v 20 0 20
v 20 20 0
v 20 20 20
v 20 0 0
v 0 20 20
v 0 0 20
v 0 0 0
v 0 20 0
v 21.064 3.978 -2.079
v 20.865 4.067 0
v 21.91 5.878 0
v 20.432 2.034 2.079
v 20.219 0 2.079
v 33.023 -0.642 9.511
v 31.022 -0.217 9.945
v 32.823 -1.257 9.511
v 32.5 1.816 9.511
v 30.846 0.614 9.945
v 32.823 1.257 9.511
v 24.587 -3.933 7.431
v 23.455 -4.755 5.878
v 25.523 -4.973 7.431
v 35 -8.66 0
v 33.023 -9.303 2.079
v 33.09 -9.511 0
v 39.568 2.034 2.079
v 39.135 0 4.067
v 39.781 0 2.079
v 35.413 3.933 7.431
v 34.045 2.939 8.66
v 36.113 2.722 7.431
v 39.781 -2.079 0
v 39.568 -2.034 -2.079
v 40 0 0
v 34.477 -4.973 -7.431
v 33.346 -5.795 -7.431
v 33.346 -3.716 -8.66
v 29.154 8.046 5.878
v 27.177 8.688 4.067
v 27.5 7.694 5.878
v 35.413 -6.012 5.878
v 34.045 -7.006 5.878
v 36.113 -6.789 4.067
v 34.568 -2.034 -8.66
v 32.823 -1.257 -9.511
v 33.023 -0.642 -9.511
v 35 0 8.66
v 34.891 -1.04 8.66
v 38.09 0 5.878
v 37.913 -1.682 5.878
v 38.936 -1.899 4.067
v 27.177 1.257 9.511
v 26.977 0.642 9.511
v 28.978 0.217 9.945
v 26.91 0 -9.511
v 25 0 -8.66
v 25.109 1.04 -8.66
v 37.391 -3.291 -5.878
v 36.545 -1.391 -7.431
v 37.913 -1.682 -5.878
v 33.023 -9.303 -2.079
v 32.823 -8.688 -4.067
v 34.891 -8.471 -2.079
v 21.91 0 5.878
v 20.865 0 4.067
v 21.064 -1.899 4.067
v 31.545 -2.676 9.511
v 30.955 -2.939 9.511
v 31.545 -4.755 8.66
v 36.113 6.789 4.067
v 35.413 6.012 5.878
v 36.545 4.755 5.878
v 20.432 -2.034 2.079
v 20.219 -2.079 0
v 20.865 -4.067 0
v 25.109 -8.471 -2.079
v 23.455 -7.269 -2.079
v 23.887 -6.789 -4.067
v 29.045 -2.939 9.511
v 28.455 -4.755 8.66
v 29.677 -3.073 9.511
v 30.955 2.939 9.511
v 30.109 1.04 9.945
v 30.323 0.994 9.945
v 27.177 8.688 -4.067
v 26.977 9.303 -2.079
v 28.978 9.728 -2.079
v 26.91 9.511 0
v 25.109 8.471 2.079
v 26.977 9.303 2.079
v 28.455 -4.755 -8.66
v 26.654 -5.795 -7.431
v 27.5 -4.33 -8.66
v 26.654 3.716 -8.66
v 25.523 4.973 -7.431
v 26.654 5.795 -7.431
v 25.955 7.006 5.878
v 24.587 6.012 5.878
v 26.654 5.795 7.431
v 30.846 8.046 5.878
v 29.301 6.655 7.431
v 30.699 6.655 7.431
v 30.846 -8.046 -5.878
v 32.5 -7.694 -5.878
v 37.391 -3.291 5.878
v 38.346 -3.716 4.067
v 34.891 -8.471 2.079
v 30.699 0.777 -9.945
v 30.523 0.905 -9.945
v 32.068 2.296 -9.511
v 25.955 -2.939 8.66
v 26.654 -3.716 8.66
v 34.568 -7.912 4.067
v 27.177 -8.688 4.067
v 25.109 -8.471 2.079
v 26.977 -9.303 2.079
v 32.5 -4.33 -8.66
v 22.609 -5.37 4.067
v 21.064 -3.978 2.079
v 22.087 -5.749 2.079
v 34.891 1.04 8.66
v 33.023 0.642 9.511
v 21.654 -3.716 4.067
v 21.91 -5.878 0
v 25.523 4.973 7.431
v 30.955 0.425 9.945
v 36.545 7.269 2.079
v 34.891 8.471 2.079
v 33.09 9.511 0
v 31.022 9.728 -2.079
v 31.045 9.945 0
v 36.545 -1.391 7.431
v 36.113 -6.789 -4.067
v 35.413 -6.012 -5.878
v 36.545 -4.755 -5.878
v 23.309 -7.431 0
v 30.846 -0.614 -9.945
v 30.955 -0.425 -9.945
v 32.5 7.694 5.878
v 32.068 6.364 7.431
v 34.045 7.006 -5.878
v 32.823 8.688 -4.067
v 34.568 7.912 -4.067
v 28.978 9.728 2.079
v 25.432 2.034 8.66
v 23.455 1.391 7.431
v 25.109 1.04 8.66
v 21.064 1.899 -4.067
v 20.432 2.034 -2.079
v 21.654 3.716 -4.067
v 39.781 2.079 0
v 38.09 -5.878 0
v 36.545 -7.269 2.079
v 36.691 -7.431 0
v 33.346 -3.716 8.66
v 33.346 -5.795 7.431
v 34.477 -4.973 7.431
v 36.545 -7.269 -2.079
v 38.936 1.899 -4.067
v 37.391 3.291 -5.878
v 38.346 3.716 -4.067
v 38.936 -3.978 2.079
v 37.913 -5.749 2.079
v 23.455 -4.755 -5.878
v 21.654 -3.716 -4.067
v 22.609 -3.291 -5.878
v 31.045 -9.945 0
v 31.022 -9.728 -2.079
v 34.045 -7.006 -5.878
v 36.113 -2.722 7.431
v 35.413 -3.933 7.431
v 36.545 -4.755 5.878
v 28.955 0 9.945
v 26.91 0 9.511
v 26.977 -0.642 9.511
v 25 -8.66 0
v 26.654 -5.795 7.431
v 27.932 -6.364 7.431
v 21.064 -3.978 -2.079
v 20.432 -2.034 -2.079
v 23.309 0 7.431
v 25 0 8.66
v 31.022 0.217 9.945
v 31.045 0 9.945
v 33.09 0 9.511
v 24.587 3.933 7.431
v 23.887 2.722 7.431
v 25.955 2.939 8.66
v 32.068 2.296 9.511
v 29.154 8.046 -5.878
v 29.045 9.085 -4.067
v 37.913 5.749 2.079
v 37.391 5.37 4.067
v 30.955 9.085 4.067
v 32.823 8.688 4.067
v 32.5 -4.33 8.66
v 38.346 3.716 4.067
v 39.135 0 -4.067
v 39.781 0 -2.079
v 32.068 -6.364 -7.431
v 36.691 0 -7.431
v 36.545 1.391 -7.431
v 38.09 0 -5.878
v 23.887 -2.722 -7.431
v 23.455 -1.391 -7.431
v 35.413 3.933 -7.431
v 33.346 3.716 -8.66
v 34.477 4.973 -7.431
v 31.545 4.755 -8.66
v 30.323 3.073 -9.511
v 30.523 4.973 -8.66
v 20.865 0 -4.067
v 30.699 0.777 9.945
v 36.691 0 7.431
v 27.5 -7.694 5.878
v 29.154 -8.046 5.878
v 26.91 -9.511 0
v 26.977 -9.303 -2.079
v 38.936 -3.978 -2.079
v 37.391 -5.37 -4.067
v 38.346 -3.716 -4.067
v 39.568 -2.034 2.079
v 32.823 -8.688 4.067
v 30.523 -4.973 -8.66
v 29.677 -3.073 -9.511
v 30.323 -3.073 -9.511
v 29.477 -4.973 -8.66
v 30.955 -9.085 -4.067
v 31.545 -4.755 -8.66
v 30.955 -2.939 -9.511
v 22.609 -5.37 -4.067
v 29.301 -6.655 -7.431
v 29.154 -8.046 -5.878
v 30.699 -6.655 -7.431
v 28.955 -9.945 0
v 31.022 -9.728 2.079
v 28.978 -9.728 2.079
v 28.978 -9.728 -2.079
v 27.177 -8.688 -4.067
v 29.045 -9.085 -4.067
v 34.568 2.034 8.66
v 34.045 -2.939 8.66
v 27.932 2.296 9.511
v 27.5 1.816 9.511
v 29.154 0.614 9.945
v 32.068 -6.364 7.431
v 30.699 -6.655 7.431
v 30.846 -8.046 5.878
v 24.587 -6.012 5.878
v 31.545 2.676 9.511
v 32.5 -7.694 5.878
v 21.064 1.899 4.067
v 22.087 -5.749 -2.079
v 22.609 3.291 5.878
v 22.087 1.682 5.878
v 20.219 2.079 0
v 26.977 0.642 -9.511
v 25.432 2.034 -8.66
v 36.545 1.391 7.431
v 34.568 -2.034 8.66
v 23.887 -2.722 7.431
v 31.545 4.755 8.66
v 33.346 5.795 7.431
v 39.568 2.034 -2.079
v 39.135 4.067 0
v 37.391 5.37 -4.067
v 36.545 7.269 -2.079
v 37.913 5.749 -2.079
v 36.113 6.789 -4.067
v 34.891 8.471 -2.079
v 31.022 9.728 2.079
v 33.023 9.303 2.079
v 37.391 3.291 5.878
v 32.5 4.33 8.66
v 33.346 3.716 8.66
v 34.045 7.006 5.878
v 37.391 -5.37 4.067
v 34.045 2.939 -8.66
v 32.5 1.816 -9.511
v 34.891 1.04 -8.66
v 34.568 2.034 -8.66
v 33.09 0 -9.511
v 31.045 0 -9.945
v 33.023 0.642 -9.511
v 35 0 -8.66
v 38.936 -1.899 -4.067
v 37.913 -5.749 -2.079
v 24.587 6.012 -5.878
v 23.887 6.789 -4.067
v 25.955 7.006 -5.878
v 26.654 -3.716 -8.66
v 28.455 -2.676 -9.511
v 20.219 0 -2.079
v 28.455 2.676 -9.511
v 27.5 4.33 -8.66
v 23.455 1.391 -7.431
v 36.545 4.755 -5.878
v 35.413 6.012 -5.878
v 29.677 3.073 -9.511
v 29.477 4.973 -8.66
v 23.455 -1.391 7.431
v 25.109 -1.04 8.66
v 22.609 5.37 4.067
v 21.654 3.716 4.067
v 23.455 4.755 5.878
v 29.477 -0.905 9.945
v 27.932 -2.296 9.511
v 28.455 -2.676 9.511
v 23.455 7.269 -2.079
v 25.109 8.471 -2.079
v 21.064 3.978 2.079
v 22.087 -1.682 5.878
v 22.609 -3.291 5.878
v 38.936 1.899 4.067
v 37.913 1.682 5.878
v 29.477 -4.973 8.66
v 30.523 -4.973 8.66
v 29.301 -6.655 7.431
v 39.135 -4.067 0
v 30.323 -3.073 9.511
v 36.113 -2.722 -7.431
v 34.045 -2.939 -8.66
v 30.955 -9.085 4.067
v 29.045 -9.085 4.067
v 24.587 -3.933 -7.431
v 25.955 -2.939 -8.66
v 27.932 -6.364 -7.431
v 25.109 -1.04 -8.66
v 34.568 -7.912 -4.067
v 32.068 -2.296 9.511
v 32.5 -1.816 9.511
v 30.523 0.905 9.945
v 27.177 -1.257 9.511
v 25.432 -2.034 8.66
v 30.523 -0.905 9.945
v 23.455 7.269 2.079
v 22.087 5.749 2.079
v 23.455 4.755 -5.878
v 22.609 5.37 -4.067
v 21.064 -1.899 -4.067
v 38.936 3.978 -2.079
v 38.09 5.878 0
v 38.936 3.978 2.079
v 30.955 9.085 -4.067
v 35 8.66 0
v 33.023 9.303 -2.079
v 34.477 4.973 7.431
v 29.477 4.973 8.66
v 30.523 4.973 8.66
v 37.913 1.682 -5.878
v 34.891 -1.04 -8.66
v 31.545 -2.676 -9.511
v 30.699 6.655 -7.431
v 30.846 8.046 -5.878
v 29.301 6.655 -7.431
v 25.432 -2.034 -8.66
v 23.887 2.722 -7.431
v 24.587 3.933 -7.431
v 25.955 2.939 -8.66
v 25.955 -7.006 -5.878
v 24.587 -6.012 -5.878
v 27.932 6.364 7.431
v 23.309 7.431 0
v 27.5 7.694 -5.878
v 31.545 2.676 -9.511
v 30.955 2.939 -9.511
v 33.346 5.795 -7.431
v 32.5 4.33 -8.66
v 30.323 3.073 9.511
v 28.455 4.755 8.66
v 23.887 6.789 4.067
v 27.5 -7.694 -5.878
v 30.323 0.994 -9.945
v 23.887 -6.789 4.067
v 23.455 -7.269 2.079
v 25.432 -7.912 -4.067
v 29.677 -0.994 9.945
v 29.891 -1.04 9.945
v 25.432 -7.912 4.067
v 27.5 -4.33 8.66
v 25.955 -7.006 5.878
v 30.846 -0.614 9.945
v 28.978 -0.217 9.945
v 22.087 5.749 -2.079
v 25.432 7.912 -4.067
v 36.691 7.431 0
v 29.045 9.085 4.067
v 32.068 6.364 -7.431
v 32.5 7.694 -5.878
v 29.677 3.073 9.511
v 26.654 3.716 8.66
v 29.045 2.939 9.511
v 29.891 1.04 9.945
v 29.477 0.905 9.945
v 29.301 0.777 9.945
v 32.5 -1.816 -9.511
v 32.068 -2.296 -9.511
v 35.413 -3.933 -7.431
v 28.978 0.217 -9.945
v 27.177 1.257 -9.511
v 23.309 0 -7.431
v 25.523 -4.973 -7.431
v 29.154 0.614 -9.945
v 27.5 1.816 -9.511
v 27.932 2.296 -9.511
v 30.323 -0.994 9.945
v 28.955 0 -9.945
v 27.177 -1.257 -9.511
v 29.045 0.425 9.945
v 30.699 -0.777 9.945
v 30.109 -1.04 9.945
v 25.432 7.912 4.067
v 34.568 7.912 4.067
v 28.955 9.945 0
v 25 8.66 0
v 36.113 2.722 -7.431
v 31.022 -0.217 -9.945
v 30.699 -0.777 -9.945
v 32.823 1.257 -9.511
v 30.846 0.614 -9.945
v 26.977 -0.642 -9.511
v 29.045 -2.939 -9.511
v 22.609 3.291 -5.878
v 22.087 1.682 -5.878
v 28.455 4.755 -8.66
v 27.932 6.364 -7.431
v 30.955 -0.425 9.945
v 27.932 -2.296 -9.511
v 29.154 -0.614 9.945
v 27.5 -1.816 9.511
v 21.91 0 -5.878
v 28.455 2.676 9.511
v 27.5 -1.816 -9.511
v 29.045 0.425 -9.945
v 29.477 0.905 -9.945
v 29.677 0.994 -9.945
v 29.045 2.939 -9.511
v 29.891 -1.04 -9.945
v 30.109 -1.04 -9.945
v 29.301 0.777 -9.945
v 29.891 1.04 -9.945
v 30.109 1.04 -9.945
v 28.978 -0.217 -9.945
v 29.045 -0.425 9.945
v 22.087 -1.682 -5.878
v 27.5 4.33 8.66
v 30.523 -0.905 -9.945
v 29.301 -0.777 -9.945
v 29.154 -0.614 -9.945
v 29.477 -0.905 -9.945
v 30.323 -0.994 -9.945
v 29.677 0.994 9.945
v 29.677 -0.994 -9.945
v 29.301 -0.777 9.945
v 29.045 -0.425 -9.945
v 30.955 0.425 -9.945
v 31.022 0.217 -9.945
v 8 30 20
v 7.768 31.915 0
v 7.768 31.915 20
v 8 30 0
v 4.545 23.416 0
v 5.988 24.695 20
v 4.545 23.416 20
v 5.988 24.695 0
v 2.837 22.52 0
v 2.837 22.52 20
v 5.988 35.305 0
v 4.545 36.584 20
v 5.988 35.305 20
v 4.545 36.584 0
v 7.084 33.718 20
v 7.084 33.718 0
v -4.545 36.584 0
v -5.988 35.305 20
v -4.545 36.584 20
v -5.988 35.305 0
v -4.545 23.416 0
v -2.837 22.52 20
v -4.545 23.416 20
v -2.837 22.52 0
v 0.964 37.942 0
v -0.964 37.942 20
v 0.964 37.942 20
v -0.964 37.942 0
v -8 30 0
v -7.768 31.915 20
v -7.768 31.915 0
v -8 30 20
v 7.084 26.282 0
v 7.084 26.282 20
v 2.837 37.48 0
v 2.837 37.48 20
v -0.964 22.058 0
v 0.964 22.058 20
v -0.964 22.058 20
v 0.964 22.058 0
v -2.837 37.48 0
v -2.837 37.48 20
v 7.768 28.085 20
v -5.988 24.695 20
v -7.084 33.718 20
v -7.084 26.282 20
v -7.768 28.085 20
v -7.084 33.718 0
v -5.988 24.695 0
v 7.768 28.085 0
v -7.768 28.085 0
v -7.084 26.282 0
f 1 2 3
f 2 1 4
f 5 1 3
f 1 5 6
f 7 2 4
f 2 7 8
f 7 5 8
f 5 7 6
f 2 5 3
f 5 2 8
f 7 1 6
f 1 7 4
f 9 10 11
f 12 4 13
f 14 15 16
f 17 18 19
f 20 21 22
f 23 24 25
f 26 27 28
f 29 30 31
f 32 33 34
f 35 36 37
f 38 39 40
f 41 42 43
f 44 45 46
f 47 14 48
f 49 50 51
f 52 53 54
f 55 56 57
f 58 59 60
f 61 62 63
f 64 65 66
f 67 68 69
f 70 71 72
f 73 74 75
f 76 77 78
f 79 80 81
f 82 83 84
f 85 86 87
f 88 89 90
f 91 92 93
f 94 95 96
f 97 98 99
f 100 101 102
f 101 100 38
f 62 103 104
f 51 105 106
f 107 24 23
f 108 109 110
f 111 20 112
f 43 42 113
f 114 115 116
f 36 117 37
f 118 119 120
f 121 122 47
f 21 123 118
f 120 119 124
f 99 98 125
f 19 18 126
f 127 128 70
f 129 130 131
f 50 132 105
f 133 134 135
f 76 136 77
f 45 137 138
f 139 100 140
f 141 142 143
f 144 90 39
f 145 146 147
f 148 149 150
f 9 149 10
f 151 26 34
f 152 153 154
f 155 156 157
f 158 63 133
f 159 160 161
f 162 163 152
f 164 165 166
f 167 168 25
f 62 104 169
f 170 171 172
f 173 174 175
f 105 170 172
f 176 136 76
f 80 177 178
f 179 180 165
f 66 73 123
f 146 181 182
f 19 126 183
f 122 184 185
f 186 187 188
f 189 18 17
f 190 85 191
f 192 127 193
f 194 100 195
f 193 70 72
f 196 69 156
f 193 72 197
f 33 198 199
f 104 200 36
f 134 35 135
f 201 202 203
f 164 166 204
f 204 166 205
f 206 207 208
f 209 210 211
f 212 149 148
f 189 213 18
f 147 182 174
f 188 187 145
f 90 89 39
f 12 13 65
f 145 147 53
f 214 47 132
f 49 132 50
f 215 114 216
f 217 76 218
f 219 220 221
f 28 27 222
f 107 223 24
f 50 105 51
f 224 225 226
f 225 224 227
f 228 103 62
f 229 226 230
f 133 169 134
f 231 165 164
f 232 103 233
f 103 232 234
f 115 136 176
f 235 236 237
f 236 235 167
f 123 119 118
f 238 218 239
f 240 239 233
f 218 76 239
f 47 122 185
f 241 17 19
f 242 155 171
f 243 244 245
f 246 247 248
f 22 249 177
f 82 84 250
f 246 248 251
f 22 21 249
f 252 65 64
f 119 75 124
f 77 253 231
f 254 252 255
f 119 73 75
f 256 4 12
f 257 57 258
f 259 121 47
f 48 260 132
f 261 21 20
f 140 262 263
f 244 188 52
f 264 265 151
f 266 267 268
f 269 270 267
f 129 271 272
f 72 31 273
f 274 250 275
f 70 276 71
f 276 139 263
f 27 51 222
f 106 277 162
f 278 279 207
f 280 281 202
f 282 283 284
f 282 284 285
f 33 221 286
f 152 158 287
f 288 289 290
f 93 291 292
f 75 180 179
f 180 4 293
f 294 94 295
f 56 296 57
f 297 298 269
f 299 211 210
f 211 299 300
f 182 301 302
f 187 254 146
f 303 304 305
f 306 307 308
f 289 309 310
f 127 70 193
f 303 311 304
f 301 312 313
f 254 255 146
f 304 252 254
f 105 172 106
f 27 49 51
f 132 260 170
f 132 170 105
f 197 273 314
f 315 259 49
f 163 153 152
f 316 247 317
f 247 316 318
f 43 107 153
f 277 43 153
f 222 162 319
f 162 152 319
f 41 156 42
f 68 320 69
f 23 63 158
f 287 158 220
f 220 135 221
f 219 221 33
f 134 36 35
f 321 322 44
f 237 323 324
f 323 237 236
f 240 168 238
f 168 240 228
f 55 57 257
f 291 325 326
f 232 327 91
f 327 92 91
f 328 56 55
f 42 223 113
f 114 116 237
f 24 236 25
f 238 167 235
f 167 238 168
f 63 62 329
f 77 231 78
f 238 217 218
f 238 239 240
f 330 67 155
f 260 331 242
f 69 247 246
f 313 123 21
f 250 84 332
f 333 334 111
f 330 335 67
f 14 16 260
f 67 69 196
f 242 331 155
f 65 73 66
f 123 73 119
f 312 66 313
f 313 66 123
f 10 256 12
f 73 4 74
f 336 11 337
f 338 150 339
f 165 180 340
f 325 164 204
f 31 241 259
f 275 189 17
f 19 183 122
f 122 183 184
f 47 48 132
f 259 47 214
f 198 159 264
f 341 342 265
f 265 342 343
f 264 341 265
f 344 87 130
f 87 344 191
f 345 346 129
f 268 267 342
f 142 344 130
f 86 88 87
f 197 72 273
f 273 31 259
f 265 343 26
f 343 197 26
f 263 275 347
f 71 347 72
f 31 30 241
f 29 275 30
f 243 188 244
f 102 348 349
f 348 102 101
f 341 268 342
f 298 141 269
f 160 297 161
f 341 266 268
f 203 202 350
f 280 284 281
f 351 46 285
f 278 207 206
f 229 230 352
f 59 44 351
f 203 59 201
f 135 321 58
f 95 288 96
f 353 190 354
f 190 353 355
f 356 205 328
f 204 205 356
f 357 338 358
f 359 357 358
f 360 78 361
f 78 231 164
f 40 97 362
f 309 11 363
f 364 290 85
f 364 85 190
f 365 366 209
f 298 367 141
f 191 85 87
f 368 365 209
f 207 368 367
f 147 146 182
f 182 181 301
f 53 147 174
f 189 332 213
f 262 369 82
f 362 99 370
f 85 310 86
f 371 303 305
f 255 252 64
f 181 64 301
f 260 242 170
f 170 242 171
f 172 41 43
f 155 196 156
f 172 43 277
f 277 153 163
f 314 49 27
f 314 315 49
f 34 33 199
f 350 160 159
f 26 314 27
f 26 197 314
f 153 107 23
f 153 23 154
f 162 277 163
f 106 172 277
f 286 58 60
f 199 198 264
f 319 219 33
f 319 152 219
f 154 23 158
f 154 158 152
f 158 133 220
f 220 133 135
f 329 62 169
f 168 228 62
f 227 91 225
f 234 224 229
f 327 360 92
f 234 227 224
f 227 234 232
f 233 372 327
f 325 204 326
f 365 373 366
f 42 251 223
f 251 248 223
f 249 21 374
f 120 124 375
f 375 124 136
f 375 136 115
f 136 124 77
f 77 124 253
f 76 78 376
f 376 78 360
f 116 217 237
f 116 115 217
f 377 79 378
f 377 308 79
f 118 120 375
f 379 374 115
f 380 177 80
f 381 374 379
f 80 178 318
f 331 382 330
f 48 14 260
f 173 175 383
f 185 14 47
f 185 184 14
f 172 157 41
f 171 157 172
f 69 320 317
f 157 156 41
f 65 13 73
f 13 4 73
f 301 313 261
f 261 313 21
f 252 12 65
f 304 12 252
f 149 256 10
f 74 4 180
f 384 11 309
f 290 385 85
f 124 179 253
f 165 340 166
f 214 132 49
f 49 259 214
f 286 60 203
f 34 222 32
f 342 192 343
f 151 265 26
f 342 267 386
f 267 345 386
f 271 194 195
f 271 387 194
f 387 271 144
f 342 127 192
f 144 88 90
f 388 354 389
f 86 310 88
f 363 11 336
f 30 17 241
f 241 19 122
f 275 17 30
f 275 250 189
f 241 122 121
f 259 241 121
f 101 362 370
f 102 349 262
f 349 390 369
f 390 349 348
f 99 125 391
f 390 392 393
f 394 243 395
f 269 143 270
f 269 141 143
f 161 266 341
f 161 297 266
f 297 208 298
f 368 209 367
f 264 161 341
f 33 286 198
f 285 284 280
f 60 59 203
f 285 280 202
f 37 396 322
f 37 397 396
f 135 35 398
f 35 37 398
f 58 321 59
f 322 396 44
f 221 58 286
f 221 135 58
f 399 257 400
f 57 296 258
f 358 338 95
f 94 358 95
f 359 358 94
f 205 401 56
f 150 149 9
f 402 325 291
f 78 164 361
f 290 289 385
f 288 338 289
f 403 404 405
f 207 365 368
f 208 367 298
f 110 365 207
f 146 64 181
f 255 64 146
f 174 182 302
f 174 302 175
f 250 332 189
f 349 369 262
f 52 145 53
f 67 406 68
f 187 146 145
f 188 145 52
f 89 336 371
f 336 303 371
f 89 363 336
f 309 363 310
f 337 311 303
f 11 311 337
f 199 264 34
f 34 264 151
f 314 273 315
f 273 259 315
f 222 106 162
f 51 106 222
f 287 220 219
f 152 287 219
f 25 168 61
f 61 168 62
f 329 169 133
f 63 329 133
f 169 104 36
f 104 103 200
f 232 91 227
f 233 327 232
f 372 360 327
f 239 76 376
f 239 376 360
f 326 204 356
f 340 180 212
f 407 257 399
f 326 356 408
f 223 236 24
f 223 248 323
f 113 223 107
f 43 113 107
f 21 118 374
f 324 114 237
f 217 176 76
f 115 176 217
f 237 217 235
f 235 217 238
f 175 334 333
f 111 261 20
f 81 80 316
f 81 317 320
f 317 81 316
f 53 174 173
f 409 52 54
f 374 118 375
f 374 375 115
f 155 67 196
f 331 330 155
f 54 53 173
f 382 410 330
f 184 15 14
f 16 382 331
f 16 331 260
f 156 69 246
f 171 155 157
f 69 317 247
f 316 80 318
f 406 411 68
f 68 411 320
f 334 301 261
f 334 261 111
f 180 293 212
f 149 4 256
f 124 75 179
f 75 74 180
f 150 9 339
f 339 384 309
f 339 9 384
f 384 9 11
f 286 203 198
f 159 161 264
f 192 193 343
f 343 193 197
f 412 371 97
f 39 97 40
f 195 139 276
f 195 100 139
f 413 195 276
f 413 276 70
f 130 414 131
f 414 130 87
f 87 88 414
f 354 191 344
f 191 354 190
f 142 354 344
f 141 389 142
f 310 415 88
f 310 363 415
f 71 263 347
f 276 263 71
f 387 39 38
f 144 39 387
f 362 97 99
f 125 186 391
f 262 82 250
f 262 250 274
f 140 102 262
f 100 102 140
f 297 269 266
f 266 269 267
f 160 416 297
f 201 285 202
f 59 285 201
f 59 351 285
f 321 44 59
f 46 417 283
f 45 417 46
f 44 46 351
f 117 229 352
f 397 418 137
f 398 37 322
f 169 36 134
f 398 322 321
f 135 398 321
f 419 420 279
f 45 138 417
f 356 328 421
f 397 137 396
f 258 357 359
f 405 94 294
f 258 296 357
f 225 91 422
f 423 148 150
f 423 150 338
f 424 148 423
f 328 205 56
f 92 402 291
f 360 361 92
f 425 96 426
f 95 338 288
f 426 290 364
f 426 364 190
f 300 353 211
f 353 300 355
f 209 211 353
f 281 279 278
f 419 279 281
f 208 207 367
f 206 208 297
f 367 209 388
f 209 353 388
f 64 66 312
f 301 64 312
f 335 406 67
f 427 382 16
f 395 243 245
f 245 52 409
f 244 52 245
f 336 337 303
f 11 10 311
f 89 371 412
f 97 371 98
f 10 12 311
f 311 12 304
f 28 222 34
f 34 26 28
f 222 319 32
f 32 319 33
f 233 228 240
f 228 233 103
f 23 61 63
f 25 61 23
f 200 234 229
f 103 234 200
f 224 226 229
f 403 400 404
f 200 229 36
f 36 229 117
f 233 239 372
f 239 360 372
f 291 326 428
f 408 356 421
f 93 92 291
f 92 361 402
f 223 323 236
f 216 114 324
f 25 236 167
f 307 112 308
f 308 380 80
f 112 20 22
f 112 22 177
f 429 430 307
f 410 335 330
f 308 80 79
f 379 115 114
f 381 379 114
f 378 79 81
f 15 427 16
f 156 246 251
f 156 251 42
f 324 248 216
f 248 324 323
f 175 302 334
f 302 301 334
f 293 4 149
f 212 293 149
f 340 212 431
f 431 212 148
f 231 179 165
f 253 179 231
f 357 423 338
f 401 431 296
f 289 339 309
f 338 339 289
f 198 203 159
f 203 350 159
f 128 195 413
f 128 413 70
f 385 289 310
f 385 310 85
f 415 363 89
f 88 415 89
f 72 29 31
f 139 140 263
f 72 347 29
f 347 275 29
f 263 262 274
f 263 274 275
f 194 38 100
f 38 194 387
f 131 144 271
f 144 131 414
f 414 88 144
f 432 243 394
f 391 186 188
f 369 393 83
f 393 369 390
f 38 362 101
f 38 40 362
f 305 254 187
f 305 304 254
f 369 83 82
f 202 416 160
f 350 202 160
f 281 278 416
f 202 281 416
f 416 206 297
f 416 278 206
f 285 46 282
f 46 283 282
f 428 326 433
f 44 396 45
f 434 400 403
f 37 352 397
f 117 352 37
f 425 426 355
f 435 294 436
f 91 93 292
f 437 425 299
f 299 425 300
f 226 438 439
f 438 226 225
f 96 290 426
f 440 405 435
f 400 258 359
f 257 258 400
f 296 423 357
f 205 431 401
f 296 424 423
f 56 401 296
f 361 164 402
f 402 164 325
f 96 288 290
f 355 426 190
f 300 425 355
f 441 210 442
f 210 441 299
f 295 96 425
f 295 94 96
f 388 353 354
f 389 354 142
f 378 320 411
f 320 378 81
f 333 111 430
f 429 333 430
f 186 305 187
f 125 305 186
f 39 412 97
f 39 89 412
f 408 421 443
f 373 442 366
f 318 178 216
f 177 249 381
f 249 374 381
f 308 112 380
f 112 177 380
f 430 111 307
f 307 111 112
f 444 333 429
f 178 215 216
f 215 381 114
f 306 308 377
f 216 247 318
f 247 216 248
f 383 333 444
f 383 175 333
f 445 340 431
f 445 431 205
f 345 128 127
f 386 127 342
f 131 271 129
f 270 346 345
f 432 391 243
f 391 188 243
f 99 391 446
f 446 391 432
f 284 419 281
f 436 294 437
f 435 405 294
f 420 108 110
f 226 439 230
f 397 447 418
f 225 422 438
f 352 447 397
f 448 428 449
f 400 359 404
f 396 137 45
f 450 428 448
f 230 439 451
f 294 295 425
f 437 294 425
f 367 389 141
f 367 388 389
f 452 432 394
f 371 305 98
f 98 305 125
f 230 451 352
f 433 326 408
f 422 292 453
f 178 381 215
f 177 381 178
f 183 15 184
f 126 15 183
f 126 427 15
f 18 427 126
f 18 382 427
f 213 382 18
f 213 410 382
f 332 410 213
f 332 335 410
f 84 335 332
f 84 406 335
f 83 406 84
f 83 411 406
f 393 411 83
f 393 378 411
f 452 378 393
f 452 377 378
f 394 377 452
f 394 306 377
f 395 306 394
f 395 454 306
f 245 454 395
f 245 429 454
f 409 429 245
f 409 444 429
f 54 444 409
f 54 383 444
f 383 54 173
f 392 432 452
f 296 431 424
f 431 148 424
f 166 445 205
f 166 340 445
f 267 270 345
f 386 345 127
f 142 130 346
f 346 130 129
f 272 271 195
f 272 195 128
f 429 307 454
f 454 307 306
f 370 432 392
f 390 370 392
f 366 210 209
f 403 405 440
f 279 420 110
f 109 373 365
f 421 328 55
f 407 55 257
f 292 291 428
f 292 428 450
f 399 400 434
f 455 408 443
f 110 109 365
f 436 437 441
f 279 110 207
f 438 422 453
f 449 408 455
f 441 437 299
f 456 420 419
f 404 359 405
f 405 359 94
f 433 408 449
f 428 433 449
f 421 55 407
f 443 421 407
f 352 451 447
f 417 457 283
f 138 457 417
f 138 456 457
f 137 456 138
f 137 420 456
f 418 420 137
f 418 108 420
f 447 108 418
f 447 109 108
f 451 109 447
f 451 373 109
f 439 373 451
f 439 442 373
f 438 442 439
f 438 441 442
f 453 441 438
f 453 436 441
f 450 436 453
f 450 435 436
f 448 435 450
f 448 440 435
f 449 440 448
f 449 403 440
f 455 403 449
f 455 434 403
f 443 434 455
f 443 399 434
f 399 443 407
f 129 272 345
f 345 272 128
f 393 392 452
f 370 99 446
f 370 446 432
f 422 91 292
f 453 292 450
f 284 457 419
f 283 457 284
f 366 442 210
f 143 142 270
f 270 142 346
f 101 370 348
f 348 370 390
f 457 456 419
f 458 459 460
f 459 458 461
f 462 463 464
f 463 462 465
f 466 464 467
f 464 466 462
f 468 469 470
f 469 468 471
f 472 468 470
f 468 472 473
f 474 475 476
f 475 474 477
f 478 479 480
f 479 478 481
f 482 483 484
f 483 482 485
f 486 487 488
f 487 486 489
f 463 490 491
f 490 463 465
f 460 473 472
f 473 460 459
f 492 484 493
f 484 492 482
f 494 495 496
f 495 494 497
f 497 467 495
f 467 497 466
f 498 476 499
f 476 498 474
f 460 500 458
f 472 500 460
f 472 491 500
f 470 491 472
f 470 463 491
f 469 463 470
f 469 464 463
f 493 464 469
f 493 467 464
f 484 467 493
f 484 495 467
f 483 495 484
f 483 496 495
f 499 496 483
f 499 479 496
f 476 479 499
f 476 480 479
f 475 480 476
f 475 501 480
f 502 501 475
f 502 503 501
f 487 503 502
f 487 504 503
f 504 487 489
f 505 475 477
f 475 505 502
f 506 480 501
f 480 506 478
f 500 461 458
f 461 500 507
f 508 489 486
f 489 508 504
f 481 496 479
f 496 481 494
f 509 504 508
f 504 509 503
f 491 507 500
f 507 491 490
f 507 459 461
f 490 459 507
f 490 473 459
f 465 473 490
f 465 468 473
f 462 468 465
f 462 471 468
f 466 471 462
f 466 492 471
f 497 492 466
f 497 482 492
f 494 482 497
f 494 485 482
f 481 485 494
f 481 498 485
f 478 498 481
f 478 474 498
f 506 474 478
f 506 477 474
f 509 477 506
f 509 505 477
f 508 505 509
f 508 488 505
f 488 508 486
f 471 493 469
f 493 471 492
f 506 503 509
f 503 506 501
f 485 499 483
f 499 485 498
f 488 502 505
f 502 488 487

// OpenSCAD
// Simple test cube
cube([20, 20, 20]);

// Add a sphere
translate([30, 0, 0])
    sphere(r=10);

// Add a cylinder
translate([0, 30, 0])
    cylinder(h=20, r=8);
